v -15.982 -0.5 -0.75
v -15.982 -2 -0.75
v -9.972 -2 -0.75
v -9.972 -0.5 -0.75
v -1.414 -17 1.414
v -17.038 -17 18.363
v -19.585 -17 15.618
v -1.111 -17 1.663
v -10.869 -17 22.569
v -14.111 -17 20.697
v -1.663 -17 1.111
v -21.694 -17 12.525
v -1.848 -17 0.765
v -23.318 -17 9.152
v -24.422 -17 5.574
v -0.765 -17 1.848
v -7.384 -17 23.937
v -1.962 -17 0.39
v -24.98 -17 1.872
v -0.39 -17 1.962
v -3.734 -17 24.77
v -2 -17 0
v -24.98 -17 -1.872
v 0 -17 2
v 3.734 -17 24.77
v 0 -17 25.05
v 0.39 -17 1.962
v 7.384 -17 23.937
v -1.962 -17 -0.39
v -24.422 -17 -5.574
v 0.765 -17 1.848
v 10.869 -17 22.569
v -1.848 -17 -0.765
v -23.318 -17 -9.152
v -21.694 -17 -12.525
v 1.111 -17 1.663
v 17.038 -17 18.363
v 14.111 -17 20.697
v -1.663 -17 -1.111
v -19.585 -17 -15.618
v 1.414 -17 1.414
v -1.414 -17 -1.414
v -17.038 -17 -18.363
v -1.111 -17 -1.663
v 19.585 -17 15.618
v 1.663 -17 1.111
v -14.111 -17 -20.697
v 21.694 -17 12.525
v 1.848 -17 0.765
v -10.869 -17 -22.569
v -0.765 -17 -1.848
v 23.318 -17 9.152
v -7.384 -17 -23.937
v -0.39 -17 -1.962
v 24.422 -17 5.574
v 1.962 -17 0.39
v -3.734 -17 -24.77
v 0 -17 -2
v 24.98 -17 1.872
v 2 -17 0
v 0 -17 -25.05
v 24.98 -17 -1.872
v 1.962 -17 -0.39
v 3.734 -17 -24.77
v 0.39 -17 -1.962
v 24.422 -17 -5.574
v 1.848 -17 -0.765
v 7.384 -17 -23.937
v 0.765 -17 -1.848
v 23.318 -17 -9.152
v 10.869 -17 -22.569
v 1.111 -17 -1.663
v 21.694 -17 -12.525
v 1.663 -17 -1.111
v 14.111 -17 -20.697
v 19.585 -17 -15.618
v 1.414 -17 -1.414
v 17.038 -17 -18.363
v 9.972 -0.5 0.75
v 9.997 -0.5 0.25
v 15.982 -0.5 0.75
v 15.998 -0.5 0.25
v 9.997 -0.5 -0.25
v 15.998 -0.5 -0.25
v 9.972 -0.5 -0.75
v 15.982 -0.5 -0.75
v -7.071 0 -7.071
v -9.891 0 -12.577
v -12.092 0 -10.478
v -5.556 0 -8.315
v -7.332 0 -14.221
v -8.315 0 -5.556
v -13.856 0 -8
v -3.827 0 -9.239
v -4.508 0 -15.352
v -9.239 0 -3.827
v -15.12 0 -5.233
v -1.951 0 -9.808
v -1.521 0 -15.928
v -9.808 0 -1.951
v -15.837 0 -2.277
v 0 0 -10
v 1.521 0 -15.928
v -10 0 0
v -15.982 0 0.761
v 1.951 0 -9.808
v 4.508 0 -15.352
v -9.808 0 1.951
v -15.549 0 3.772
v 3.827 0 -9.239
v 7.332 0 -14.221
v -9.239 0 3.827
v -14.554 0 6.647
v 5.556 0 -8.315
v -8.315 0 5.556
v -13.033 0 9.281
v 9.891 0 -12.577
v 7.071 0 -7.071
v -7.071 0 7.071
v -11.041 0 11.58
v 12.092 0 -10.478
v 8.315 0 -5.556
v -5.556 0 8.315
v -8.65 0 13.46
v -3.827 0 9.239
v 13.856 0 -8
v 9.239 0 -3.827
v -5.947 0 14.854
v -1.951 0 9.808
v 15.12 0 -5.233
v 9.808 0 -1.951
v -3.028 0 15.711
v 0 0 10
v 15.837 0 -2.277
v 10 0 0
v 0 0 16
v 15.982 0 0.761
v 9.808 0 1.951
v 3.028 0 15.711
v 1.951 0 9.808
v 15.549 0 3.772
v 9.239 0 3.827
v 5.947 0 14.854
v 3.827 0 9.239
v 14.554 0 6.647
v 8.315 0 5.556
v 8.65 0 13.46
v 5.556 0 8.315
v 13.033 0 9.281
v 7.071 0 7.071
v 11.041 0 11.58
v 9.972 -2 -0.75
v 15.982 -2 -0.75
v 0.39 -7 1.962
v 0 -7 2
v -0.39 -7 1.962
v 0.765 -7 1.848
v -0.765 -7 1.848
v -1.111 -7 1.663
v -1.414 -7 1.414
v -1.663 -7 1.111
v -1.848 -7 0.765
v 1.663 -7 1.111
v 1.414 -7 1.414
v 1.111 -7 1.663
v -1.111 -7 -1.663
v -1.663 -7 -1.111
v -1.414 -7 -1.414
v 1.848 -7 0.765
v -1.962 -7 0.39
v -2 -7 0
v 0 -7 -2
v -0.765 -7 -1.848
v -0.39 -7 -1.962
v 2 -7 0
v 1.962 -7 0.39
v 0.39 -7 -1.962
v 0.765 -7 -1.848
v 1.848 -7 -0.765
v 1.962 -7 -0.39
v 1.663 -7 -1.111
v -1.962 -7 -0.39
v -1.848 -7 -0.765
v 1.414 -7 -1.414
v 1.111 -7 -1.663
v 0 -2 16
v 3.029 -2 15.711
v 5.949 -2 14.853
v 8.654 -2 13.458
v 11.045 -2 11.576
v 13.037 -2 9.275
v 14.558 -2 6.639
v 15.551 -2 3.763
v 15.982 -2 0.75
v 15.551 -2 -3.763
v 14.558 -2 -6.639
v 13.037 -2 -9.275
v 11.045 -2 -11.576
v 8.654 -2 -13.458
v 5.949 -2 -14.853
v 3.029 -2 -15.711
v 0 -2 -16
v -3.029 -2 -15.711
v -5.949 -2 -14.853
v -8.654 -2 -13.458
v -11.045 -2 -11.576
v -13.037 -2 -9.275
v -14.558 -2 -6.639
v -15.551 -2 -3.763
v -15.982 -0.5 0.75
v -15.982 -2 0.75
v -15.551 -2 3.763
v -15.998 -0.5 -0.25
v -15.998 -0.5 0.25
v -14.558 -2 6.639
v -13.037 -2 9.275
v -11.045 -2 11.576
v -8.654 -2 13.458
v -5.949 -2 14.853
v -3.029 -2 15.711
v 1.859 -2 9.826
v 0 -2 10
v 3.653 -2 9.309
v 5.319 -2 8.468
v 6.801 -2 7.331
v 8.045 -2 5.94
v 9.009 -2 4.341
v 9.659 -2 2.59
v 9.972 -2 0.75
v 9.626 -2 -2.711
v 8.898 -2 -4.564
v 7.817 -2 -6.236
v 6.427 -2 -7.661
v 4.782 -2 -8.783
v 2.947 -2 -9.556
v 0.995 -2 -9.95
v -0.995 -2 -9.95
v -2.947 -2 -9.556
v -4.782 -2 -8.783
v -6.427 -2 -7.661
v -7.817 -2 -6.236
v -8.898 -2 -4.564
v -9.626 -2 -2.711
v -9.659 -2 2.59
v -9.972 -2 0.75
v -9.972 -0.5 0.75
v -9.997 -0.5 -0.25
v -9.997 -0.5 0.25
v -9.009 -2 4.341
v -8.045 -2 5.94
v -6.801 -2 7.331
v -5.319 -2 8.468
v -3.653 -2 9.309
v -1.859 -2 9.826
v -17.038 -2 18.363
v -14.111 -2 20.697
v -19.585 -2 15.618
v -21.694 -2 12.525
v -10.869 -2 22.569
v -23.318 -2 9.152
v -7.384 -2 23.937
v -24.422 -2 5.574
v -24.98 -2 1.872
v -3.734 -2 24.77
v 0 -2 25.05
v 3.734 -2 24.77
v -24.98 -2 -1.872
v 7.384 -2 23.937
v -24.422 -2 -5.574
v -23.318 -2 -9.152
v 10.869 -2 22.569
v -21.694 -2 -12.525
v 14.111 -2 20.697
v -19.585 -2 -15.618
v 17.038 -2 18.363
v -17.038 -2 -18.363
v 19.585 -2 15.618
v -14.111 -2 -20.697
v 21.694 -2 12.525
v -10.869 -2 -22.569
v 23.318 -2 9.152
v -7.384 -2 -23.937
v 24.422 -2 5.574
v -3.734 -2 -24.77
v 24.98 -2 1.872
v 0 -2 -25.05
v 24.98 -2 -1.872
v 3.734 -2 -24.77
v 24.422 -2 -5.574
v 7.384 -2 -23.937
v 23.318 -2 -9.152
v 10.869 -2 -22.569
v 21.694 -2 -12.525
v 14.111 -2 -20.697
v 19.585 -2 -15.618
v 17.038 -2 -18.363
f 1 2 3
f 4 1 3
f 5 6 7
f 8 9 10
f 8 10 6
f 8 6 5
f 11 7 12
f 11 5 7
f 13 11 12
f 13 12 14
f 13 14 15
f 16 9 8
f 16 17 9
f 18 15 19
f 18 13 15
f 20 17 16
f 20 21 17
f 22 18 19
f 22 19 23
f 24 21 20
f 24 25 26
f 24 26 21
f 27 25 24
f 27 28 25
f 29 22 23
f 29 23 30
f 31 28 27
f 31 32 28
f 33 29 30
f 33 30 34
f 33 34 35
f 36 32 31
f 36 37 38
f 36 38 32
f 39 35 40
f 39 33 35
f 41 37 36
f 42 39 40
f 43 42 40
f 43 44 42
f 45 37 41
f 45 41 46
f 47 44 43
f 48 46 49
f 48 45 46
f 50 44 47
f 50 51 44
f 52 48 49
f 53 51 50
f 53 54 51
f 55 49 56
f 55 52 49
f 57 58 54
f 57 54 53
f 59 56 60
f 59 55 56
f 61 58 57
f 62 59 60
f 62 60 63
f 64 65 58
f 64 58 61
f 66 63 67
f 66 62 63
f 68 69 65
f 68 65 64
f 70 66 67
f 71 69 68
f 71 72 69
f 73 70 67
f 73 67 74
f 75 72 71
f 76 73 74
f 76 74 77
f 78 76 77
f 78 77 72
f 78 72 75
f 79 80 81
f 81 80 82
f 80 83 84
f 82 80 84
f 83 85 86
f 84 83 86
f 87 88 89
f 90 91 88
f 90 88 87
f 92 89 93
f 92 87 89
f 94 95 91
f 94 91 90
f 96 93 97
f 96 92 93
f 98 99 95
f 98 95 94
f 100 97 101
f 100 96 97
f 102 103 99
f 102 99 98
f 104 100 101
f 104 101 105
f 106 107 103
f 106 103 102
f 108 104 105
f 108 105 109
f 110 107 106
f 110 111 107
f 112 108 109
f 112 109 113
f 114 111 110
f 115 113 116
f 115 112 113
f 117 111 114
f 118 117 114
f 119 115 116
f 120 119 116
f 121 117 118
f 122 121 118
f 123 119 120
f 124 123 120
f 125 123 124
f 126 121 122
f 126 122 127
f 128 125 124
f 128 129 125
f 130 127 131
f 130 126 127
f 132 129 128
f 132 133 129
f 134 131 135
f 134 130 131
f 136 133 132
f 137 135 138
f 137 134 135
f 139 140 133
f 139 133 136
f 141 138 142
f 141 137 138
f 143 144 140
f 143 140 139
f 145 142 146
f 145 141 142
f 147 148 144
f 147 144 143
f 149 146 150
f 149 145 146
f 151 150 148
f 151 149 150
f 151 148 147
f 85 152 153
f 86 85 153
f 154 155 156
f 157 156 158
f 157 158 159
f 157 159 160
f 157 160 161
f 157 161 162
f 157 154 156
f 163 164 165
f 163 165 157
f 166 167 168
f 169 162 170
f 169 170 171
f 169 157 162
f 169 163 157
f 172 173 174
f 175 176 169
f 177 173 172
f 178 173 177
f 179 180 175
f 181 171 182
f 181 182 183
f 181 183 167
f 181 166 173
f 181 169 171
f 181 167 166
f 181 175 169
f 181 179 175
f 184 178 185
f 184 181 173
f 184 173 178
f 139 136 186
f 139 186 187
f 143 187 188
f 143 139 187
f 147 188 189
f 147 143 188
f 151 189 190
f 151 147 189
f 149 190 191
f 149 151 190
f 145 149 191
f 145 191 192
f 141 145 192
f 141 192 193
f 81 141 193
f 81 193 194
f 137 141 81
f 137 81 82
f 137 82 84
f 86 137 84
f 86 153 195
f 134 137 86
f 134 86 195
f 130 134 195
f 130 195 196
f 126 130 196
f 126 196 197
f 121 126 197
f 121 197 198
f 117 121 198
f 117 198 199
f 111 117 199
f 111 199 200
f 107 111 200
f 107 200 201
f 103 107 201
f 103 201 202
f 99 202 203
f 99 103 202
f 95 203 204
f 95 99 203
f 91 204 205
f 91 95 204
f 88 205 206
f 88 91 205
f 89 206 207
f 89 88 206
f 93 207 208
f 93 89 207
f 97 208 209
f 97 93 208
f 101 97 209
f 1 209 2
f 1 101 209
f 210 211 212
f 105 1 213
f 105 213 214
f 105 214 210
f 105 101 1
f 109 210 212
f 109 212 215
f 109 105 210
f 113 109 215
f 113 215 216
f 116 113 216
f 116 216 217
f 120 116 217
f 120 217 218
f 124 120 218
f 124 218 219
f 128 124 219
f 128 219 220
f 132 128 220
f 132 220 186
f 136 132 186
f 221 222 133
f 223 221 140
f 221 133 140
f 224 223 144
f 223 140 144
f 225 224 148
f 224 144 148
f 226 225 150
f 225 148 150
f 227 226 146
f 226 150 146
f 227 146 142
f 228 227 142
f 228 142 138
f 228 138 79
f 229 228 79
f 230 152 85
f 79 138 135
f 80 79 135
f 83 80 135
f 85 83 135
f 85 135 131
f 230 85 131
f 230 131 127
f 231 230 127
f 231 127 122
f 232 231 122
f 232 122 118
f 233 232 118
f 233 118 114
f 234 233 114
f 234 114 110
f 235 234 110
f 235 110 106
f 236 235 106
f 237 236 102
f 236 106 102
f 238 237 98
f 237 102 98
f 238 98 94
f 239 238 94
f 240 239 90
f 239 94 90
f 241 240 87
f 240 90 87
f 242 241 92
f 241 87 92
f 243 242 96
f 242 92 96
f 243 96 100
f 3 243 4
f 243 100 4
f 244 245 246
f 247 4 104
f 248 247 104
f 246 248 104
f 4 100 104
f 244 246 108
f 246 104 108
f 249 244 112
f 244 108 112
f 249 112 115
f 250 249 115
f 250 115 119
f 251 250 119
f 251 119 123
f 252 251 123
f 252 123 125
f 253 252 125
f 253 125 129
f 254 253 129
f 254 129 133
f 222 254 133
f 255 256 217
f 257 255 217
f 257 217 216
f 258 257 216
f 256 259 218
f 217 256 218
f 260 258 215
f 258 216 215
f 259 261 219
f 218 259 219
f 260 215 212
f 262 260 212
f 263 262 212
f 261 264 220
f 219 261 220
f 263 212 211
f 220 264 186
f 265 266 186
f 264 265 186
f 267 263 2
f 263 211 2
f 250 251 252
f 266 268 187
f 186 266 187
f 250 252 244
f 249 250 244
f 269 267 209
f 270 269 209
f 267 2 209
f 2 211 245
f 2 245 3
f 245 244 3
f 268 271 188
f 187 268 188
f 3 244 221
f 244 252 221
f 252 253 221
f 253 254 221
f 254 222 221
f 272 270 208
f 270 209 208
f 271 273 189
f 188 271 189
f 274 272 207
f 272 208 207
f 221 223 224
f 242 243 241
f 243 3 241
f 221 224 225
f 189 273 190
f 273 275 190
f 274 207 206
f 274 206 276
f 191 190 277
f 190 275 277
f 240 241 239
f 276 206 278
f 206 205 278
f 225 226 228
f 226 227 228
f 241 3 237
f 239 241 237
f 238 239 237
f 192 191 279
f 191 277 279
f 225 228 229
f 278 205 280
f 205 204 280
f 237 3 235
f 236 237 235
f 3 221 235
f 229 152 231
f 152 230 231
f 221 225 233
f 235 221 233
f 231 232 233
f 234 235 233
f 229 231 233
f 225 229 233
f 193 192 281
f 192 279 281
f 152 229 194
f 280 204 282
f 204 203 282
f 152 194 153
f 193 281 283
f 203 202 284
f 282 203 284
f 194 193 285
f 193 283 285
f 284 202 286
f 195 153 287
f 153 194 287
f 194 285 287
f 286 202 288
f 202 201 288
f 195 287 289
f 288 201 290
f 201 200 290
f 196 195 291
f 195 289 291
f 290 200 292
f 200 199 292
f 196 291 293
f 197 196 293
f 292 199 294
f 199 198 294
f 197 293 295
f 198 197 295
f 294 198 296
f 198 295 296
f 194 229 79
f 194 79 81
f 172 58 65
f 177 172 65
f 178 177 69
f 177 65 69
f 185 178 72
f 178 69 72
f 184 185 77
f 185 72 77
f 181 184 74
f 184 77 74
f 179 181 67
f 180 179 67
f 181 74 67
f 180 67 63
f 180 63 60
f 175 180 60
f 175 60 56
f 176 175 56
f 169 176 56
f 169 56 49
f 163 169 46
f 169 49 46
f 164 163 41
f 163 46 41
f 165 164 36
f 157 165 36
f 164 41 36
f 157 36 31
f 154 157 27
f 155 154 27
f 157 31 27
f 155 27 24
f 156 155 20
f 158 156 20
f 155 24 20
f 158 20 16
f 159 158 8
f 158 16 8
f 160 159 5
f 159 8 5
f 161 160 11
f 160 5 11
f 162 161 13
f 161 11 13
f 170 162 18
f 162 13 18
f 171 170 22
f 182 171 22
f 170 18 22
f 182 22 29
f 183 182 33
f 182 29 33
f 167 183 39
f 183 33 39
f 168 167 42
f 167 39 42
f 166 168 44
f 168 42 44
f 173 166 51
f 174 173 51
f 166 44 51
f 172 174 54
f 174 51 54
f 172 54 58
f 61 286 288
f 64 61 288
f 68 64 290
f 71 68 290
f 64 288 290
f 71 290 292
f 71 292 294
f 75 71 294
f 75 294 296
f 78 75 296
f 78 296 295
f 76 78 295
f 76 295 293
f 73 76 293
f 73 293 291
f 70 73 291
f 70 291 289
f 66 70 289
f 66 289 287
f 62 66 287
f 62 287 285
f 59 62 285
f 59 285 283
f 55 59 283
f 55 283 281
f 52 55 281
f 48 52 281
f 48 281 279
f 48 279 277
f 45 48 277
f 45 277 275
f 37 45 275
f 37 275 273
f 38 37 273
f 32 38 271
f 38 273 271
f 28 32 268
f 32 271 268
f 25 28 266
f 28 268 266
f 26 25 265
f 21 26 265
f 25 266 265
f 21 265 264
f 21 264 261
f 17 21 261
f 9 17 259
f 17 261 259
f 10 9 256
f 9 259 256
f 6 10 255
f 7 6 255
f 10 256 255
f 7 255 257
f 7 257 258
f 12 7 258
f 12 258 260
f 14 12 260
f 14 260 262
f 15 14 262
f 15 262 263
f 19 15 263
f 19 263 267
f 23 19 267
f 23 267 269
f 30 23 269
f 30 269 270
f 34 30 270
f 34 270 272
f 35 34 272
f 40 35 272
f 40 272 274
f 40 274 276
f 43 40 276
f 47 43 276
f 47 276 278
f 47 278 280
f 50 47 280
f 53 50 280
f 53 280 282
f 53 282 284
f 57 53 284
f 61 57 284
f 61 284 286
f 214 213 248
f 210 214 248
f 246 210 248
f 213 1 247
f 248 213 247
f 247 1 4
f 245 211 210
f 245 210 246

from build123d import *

# Parameters (mm, degrees)
SKETCH_1_R          = 16
EXTRUDE_1_DEPTH     = 2
SKETCH_2_R          = 25.05
EXTRUDE_2_DEPTH     = 15
SKETCH_4_R          = 2
CUT_EXTRUDE_1_DEPTH = 10
SKETCH_6_W          = 60
SKETCH_6_H          = 1.5
CUT_EXTRUDE_2_DEPTH = 1.5
SKETCH_8_R          = 10
CUT_EXTRUDE_3_DEPTH = 2


with BuildPart() as part:
    # 草图1 → 凸台-拉伸1 (new body)
    with BuildSketch(Plane(origin=(0, 0, 0), x_dir=(1, 0, 0), z_dir=(0, 1, 0))):
        with Locations(Location((0, 0, 0), (0, 0, 270))):
            Circle(SKETCH_1_R)
    extrude(amount=-EXTRUDE_1_DEPTH)

    # 草图2 → 凸台-拉伸2 (add)
    with BuildSketch(Plane.XZ.offset(2)):
        with Locations(Location((0, 0, 0), (0, 0, 270))):
            Circle(SKETCH_2_R)
    extrude(amount=EXTRUDE_2_DEPTH)

    # 草图4 → 切除-拉伸1 (cut)
    with BuildSketch(Plane.XZ.offset(17)):
        with Locations(Location((0, 0, 0), (0, 0, 270))):
            Circle(SKETCH_4_R)
    extrude(amount=-CUT_EXTRUDE_1_DEPTH, mode=Mode.SUBTRACT)

    # 草图6 → 切除-拉伸2 (cut)
    with BuildSketch(Plane(origin=(0, -2, 0), x_dir=(1, 0, 0), z_dir=(0, 1, 0))):
        Rectangle(SKETCH_6_W, SKETCH_6_H)
    extrude(amount=CUT_EXTRUDE_2_DEPTH, mode=Mode.SUBTRACT)

    # 草图8 → 切除-拉伸3 (cut)
    with BuildSketch(Plane(origin=(0, 0, 0), x_dir=(1, 0, 0), z_dir=(0, 1, 0))):
        with Locations(Location((0, 0, 0), (0, 0, 270))):
            Circle(SKETCH_8_R)
    extrude(amount=-CUT_EXTRUDE_3_DEPTH, mode=Mode.SUBTRACT)


solid = part.part
